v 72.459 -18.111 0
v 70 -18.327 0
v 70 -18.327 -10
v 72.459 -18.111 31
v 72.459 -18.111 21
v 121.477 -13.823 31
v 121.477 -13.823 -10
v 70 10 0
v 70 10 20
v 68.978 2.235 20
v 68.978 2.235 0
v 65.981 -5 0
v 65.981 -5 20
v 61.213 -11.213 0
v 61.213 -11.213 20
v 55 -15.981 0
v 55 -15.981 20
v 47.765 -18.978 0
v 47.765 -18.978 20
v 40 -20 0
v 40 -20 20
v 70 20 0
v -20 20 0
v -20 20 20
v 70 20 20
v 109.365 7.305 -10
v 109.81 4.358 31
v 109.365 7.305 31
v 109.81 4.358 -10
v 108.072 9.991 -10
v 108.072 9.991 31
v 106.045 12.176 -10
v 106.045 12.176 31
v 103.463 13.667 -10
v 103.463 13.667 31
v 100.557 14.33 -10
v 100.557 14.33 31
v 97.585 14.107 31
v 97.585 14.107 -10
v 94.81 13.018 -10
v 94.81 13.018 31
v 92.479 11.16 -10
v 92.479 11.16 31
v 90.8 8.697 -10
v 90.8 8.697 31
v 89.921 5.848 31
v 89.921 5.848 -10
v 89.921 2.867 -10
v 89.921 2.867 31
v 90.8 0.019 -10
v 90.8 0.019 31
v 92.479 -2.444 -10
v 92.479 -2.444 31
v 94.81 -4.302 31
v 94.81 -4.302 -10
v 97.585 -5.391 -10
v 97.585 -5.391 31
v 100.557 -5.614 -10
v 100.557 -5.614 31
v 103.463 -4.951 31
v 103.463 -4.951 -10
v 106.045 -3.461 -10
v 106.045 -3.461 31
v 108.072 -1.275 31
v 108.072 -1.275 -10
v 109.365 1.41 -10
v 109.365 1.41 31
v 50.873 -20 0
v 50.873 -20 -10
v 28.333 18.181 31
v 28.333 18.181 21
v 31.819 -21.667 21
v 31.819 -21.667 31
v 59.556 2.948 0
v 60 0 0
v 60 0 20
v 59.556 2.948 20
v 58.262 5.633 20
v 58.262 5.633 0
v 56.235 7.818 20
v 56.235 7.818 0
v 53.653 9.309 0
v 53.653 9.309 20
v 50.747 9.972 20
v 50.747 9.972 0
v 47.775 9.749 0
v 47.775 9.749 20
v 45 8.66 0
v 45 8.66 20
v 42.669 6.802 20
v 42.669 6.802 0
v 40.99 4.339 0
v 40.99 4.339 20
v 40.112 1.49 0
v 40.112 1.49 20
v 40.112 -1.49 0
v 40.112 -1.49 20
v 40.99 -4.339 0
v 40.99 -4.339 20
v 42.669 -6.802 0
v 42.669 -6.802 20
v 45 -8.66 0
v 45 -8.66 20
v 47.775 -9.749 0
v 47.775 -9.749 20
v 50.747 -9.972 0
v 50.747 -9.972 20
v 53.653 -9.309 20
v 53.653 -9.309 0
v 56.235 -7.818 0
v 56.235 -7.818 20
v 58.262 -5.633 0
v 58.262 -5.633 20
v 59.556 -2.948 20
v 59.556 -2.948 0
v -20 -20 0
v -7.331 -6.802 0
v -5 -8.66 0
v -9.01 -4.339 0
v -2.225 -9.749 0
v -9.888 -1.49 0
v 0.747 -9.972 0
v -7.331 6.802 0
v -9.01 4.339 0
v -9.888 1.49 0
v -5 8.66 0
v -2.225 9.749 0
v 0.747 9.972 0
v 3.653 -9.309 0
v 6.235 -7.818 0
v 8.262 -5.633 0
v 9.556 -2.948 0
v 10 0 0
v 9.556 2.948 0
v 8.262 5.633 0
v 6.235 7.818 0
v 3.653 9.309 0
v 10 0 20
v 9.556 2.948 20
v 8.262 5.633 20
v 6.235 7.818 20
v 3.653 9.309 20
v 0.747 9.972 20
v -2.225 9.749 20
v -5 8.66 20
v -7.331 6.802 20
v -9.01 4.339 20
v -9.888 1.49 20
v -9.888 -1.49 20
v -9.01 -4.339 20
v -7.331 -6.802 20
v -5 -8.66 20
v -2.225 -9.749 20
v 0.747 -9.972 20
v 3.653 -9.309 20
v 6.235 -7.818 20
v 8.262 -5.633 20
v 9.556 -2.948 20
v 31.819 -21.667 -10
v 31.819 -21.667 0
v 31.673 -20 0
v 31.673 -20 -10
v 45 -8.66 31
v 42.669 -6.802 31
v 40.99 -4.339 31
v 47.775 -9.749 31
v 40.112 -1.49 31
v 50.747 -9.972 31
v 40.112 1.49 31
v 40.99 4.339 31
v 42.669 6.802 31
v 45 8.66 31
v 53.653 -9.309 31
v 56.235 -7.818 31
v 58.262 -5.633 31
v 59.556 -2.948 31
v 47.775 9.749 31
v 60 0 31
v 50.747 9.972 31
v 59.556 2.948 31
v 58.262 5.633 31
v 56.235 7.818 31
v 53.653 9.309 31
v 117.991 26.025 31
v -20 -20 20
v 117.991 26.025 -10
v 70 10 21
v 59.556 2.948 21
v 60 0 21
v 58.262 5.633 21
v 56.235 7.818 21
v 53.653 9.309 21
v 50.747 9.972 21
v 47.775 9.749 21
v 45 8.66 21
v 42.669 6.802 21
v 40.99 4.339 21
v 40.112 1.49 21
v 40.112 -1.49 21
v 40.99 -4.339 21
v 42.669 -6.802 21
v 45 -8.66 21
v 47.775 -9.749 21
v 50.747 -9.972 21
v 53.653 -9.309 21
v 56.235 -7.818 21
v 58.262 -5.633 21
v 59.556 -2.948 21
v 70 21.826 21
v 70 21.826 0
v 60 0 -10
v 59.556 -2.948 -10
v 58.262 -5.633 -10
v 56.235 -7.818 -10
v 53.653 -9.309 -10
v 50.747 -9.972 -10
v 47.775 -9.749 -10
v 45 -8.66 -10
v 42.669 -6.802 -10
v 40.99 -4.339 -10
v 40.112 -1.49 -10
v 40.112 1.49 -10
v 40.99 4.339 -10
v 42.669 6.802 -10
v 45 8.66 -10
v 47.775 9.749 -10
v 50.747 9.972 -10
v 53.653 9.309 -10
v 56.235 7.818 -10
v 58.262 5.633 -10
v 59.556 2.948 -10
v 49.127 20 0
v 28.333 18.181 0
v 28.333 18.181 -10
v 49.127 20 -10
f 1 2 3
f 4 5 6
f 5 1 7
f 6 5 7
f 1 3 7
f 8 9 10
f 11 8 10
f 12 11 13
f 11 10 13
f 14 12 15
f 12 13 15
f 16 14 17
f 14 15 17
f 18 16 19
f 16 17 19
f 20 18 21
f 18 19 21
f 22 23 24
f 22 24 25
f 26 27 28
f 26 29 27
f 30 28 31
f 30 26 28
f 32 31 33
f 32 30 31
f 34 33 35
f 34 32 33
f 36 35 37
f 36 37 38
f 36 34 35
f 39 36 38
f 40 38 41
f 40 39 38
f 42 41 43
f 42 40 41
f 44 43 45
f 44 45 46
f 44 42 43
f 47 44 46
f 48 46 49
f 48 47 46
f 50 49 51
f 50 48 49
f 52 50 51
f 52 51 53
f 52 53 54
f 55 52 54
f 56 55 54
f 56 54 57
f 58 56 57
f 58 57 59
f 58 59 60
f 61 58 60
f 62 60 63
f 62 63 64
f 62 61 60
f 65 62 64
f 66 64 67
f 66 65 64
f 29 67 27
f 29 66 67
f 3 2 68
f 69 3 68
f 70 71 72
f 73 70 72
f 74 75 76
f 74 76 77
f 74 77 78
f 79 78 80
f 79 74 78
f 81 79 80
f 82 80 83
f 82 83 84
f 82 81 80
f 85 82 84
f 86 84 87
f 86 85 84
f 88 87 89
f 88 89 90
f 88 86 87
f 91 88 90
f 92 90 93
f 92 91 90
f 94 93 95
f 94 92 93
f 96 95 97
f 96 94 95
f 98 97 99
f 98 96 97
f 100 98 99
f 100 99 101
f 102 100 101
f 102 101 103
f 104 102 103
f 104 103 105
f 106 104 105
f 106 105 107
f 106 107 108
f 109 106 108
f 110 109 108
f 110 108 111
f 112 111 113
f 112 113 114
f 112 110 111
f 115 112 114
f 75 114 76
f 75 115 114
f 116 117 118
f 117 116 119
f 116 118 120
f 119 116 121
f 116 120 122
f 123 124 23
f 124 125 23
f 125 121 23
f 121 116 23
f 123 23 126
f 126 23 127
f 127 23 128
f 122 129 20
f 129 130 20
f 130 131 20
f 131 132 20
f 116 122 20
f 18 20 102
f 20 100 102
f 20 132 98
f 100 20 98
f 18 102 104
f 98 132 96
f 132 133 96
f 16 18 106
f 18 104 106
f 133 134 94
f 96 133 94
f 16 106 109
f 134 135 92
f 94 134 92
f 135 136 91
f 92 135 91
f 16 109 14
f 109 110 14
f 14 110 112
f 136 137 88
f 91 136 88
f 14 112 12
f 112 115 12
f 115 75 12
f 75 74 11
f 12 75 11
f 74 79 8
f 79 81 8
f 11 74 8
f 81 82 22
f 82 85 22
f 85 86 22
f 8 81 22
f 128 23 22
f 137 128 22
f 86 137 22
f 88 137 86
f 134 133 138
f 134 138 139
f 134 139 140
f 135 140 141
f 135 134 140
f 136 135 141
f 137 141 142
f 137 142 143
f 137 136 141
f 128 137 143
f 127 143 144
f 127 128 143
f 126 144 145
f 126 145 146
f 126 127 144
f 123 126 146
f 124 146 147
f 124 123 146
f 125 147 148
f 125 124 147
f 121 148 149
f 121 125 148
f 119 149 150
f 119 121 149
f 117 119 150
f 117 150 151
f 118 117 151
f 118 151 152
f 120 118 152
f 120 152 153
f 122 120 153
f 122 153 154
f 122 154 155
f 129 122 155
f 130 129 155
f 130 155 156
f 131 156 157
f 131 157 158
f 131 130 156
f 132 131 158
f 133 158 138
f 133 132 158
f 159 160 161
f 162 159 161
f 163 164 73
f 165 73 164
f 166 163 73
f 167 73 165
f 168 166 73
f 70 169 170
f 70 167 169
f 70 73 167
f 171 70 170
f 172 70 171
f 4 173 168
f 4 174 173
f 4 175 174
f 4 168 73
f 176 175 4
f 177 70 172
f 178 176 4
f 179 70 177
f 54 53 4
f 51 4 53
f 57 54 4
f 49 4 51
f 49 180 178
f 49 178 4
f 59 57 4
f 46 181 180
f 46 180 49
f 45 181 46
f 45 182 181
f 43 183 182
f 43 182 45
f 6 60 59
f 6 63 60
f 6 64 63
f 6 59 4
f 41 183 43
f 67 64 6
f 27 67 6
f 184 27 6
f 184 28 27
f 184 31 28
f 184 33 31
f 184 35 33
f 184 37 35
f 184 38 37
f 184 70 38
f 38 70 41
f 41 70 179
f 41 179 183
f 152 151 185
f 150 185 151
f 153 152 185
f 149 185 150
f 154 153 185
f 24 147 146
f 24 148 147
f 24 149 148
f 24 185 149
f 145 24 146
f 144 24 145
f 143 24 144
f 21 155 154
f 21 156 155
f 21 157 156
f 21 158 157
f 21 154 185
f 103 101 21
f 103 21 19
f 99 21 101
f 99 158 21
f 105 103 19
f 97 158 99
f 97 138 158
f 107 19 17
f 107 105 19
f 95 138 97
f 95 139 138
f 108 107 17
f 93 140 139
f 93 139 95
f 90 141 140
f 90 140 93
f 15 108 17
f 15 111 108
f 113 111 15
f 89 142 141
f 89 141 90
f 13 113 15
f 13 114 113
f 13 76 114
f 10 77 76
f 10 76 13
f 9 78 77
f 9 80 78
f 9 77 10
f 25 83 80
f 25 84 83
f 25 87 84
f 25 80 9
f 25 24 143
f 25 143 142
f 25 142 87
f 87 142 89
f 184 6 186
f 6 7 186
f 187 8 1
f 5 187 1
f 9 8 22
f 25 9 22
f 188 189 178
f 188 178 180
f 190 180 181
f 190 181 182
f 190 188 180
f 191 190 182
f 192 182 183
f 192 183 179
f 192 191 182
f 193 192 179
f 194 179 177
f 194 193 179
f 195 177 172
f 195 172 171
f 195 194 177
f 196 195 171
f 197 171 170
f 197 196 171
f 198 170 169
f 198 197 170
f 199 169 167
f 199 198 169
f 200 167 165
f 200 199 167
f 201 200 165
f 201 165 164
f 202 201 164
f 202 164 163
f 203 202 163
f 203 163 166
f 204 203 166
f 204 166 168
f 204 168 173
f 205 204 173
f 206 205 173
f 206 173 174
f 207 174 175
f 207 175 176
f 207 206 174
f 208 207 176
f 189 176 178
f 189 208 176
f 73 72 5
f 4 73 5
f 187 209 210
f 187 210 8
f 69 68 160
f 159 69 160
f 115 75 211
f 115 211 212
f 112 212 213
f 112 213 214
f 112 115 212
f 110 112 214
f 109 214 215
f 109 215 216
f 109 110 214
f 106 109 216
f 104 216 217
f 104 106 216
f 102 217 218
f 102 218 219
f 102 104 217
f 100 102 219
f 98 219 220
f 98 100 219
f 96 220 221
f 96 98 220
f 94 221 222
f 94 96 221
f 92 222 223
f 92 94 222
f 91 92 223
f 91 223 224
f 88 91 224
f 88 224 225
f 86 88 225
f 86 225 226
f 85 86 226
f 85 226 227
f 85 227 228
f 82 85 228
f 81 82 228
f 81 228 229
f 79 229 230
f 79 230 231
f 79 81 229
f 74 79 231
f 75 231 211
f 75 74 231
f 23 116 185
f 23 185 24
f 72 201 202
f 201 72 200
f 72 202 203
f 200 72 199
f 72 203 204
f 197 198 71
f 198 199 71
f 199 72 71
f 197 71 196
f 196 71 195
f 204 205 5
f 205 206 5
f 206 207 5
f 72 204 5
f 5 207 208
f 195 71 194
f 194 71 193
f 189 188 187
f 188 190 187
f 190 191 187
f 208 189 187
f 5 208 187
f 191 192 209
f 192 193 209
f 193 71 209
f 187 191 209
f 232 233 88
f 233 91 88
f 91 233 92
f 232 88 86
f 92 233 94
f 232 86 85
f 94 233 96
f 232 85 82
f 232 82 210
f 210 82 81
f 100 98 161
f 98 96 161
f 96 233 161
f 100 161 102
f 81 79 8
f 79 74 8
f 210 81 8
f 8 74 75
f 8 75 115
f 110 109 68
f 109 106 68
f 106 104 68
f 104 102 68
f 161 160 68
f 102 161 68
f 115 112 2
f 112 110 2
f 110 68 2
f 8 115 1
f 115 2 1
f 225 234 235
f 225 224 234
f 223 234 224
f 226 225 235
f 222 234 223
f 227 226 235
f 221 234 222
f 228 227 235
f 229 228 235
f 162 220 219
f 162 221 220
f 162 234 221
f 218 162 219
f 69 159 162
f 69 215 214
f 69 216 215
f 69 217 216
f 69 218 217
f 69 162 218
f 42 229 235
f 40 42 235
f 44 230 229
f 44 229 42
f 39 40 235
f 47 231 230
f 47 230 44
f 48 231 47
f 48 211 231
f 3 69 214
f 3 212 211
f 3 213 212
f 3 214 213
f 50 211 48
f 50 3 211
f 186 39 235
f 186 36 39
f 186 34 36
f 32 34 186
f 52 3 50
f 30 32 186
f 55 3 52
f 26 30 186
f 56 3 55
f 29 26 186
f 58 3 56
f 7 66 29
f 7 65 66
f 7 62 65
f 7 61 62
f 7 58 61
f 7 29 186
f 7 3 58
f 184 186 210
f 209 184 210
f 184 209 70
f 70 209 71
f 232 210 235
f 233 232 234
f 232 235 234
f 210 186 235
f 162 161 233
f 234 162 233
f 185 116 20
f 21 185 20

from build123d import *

# Parameters (mm, degrees)
F0_W     = 90
F0_H     = 40
F0_R     = 10
F1_DEPTH = 20
F2_R     = 10
F3_DEPTH = 10
F5_DEPTH = 30.001
F6_R     = 10
F7_DEPTH = 21
F8_R     = 10
F9_DEPTH = 10


with BuildPart() as f1:
    # F0 (on Top) → F1 (new body)
    with BuildSketch(Plane.XY):
        with Locations((25, 0)):
            Rectangle(F0_W, F0_H)
        Circle(F0_R, mode=Mode.SUBTRACT)
        with Locations((50, 0)):
            Circle(F0_R, mode=Mode.SUBTRACT)
    extrude(amount=F1_DEPTH)

    # F4 (on face) → F5 (cut, through all)
    with BuildSketch(Plane.XY.offset(20)):
        with BuildLine():
            Line((70, -20), (70, 10))
            ThreePointArc((70, 10), (61.2132034356, -11.2132034356), (40, -20))
            Line((40, -20), (70, -20))
        make_face()
    extrude(amount=-F5_DEPTH, mode=Mode.SUBTRACT)


with BuildPart() as f3:
    # F2 (on face) → F3 (new body)
    with BuildSketch(Plane(origin=(0, 0, 0), x_dir=(1, 0, 0), z_dir=(0, 0, -1))):
        Polygon((50.8732188582, 20), (31.8192208931, 21.6670088168), (31.6733765197, 20), align=None)
        Polygon((70, 18.3266234803), (50.8732188582, 20), (31.6733765197, 20), (28.3329911832, -18.1807791069), (49.1267811418, -20), (70, -20), align=None)
        with Locations((50, 0)):
            Circle(F2_R, mode=Mode.SUBTRACT)
        Polygon((121.4767437214, 13.8229919695), (70, 18.3266234803), (70, -20), (49.1267811418, -20), (117.9905140115, -26.0247959542), align=None)
        with Locations((99.8097349046, -4.3577871374)):
            Circle(F2_R, mode=Mode.SUBTRACT)
    extrude(amount=F3_DEPTH)

    # F6 (on face) → F7 (join)
    with BuildSketch(Plane.XY):
        Polygon((70, 21.8261700214), (70, 20), (70, 10), (72.4594332734, -18.1114509502), (121.4767437214, -13.8229919695), (117.9905140115, 26.0247959542), align=None)
        with Locations((99.8097349046, 4.3577871374)):
            Circle(F6_R, mode=Mode.SUBTRACT)
    extrude(amount=F7_DEPTH)

    # F8 (on face) → F9 (join)
    with BuildSketch(Plane.XY.offset(21)):
        Polygon((70, 10), (72.4594332734, -18.1114509502), (121.4767437214, -13.8229919695), (117.9905140115, 26.0247959542), (70, 21.8261700214), align=None)
        with Locations((99.8097349046, 4.3577871374)):
            Circle(F8_R, mode=Mode.SUBTRACT)
        Polygon((28.3329911832, 18.1807791069), (31.8192208931, -21.6670088168), (72.4594332734, -18.1114509502), (70, 10), (70, 21.8261700214), align=None)
        with Locations((50, 0)):
            Circle(F8_R, mode=Mode.SUBTRACT)
    extrude(amount=F9_DEPTH)


solid = Compound([f1.part, f3.part])
